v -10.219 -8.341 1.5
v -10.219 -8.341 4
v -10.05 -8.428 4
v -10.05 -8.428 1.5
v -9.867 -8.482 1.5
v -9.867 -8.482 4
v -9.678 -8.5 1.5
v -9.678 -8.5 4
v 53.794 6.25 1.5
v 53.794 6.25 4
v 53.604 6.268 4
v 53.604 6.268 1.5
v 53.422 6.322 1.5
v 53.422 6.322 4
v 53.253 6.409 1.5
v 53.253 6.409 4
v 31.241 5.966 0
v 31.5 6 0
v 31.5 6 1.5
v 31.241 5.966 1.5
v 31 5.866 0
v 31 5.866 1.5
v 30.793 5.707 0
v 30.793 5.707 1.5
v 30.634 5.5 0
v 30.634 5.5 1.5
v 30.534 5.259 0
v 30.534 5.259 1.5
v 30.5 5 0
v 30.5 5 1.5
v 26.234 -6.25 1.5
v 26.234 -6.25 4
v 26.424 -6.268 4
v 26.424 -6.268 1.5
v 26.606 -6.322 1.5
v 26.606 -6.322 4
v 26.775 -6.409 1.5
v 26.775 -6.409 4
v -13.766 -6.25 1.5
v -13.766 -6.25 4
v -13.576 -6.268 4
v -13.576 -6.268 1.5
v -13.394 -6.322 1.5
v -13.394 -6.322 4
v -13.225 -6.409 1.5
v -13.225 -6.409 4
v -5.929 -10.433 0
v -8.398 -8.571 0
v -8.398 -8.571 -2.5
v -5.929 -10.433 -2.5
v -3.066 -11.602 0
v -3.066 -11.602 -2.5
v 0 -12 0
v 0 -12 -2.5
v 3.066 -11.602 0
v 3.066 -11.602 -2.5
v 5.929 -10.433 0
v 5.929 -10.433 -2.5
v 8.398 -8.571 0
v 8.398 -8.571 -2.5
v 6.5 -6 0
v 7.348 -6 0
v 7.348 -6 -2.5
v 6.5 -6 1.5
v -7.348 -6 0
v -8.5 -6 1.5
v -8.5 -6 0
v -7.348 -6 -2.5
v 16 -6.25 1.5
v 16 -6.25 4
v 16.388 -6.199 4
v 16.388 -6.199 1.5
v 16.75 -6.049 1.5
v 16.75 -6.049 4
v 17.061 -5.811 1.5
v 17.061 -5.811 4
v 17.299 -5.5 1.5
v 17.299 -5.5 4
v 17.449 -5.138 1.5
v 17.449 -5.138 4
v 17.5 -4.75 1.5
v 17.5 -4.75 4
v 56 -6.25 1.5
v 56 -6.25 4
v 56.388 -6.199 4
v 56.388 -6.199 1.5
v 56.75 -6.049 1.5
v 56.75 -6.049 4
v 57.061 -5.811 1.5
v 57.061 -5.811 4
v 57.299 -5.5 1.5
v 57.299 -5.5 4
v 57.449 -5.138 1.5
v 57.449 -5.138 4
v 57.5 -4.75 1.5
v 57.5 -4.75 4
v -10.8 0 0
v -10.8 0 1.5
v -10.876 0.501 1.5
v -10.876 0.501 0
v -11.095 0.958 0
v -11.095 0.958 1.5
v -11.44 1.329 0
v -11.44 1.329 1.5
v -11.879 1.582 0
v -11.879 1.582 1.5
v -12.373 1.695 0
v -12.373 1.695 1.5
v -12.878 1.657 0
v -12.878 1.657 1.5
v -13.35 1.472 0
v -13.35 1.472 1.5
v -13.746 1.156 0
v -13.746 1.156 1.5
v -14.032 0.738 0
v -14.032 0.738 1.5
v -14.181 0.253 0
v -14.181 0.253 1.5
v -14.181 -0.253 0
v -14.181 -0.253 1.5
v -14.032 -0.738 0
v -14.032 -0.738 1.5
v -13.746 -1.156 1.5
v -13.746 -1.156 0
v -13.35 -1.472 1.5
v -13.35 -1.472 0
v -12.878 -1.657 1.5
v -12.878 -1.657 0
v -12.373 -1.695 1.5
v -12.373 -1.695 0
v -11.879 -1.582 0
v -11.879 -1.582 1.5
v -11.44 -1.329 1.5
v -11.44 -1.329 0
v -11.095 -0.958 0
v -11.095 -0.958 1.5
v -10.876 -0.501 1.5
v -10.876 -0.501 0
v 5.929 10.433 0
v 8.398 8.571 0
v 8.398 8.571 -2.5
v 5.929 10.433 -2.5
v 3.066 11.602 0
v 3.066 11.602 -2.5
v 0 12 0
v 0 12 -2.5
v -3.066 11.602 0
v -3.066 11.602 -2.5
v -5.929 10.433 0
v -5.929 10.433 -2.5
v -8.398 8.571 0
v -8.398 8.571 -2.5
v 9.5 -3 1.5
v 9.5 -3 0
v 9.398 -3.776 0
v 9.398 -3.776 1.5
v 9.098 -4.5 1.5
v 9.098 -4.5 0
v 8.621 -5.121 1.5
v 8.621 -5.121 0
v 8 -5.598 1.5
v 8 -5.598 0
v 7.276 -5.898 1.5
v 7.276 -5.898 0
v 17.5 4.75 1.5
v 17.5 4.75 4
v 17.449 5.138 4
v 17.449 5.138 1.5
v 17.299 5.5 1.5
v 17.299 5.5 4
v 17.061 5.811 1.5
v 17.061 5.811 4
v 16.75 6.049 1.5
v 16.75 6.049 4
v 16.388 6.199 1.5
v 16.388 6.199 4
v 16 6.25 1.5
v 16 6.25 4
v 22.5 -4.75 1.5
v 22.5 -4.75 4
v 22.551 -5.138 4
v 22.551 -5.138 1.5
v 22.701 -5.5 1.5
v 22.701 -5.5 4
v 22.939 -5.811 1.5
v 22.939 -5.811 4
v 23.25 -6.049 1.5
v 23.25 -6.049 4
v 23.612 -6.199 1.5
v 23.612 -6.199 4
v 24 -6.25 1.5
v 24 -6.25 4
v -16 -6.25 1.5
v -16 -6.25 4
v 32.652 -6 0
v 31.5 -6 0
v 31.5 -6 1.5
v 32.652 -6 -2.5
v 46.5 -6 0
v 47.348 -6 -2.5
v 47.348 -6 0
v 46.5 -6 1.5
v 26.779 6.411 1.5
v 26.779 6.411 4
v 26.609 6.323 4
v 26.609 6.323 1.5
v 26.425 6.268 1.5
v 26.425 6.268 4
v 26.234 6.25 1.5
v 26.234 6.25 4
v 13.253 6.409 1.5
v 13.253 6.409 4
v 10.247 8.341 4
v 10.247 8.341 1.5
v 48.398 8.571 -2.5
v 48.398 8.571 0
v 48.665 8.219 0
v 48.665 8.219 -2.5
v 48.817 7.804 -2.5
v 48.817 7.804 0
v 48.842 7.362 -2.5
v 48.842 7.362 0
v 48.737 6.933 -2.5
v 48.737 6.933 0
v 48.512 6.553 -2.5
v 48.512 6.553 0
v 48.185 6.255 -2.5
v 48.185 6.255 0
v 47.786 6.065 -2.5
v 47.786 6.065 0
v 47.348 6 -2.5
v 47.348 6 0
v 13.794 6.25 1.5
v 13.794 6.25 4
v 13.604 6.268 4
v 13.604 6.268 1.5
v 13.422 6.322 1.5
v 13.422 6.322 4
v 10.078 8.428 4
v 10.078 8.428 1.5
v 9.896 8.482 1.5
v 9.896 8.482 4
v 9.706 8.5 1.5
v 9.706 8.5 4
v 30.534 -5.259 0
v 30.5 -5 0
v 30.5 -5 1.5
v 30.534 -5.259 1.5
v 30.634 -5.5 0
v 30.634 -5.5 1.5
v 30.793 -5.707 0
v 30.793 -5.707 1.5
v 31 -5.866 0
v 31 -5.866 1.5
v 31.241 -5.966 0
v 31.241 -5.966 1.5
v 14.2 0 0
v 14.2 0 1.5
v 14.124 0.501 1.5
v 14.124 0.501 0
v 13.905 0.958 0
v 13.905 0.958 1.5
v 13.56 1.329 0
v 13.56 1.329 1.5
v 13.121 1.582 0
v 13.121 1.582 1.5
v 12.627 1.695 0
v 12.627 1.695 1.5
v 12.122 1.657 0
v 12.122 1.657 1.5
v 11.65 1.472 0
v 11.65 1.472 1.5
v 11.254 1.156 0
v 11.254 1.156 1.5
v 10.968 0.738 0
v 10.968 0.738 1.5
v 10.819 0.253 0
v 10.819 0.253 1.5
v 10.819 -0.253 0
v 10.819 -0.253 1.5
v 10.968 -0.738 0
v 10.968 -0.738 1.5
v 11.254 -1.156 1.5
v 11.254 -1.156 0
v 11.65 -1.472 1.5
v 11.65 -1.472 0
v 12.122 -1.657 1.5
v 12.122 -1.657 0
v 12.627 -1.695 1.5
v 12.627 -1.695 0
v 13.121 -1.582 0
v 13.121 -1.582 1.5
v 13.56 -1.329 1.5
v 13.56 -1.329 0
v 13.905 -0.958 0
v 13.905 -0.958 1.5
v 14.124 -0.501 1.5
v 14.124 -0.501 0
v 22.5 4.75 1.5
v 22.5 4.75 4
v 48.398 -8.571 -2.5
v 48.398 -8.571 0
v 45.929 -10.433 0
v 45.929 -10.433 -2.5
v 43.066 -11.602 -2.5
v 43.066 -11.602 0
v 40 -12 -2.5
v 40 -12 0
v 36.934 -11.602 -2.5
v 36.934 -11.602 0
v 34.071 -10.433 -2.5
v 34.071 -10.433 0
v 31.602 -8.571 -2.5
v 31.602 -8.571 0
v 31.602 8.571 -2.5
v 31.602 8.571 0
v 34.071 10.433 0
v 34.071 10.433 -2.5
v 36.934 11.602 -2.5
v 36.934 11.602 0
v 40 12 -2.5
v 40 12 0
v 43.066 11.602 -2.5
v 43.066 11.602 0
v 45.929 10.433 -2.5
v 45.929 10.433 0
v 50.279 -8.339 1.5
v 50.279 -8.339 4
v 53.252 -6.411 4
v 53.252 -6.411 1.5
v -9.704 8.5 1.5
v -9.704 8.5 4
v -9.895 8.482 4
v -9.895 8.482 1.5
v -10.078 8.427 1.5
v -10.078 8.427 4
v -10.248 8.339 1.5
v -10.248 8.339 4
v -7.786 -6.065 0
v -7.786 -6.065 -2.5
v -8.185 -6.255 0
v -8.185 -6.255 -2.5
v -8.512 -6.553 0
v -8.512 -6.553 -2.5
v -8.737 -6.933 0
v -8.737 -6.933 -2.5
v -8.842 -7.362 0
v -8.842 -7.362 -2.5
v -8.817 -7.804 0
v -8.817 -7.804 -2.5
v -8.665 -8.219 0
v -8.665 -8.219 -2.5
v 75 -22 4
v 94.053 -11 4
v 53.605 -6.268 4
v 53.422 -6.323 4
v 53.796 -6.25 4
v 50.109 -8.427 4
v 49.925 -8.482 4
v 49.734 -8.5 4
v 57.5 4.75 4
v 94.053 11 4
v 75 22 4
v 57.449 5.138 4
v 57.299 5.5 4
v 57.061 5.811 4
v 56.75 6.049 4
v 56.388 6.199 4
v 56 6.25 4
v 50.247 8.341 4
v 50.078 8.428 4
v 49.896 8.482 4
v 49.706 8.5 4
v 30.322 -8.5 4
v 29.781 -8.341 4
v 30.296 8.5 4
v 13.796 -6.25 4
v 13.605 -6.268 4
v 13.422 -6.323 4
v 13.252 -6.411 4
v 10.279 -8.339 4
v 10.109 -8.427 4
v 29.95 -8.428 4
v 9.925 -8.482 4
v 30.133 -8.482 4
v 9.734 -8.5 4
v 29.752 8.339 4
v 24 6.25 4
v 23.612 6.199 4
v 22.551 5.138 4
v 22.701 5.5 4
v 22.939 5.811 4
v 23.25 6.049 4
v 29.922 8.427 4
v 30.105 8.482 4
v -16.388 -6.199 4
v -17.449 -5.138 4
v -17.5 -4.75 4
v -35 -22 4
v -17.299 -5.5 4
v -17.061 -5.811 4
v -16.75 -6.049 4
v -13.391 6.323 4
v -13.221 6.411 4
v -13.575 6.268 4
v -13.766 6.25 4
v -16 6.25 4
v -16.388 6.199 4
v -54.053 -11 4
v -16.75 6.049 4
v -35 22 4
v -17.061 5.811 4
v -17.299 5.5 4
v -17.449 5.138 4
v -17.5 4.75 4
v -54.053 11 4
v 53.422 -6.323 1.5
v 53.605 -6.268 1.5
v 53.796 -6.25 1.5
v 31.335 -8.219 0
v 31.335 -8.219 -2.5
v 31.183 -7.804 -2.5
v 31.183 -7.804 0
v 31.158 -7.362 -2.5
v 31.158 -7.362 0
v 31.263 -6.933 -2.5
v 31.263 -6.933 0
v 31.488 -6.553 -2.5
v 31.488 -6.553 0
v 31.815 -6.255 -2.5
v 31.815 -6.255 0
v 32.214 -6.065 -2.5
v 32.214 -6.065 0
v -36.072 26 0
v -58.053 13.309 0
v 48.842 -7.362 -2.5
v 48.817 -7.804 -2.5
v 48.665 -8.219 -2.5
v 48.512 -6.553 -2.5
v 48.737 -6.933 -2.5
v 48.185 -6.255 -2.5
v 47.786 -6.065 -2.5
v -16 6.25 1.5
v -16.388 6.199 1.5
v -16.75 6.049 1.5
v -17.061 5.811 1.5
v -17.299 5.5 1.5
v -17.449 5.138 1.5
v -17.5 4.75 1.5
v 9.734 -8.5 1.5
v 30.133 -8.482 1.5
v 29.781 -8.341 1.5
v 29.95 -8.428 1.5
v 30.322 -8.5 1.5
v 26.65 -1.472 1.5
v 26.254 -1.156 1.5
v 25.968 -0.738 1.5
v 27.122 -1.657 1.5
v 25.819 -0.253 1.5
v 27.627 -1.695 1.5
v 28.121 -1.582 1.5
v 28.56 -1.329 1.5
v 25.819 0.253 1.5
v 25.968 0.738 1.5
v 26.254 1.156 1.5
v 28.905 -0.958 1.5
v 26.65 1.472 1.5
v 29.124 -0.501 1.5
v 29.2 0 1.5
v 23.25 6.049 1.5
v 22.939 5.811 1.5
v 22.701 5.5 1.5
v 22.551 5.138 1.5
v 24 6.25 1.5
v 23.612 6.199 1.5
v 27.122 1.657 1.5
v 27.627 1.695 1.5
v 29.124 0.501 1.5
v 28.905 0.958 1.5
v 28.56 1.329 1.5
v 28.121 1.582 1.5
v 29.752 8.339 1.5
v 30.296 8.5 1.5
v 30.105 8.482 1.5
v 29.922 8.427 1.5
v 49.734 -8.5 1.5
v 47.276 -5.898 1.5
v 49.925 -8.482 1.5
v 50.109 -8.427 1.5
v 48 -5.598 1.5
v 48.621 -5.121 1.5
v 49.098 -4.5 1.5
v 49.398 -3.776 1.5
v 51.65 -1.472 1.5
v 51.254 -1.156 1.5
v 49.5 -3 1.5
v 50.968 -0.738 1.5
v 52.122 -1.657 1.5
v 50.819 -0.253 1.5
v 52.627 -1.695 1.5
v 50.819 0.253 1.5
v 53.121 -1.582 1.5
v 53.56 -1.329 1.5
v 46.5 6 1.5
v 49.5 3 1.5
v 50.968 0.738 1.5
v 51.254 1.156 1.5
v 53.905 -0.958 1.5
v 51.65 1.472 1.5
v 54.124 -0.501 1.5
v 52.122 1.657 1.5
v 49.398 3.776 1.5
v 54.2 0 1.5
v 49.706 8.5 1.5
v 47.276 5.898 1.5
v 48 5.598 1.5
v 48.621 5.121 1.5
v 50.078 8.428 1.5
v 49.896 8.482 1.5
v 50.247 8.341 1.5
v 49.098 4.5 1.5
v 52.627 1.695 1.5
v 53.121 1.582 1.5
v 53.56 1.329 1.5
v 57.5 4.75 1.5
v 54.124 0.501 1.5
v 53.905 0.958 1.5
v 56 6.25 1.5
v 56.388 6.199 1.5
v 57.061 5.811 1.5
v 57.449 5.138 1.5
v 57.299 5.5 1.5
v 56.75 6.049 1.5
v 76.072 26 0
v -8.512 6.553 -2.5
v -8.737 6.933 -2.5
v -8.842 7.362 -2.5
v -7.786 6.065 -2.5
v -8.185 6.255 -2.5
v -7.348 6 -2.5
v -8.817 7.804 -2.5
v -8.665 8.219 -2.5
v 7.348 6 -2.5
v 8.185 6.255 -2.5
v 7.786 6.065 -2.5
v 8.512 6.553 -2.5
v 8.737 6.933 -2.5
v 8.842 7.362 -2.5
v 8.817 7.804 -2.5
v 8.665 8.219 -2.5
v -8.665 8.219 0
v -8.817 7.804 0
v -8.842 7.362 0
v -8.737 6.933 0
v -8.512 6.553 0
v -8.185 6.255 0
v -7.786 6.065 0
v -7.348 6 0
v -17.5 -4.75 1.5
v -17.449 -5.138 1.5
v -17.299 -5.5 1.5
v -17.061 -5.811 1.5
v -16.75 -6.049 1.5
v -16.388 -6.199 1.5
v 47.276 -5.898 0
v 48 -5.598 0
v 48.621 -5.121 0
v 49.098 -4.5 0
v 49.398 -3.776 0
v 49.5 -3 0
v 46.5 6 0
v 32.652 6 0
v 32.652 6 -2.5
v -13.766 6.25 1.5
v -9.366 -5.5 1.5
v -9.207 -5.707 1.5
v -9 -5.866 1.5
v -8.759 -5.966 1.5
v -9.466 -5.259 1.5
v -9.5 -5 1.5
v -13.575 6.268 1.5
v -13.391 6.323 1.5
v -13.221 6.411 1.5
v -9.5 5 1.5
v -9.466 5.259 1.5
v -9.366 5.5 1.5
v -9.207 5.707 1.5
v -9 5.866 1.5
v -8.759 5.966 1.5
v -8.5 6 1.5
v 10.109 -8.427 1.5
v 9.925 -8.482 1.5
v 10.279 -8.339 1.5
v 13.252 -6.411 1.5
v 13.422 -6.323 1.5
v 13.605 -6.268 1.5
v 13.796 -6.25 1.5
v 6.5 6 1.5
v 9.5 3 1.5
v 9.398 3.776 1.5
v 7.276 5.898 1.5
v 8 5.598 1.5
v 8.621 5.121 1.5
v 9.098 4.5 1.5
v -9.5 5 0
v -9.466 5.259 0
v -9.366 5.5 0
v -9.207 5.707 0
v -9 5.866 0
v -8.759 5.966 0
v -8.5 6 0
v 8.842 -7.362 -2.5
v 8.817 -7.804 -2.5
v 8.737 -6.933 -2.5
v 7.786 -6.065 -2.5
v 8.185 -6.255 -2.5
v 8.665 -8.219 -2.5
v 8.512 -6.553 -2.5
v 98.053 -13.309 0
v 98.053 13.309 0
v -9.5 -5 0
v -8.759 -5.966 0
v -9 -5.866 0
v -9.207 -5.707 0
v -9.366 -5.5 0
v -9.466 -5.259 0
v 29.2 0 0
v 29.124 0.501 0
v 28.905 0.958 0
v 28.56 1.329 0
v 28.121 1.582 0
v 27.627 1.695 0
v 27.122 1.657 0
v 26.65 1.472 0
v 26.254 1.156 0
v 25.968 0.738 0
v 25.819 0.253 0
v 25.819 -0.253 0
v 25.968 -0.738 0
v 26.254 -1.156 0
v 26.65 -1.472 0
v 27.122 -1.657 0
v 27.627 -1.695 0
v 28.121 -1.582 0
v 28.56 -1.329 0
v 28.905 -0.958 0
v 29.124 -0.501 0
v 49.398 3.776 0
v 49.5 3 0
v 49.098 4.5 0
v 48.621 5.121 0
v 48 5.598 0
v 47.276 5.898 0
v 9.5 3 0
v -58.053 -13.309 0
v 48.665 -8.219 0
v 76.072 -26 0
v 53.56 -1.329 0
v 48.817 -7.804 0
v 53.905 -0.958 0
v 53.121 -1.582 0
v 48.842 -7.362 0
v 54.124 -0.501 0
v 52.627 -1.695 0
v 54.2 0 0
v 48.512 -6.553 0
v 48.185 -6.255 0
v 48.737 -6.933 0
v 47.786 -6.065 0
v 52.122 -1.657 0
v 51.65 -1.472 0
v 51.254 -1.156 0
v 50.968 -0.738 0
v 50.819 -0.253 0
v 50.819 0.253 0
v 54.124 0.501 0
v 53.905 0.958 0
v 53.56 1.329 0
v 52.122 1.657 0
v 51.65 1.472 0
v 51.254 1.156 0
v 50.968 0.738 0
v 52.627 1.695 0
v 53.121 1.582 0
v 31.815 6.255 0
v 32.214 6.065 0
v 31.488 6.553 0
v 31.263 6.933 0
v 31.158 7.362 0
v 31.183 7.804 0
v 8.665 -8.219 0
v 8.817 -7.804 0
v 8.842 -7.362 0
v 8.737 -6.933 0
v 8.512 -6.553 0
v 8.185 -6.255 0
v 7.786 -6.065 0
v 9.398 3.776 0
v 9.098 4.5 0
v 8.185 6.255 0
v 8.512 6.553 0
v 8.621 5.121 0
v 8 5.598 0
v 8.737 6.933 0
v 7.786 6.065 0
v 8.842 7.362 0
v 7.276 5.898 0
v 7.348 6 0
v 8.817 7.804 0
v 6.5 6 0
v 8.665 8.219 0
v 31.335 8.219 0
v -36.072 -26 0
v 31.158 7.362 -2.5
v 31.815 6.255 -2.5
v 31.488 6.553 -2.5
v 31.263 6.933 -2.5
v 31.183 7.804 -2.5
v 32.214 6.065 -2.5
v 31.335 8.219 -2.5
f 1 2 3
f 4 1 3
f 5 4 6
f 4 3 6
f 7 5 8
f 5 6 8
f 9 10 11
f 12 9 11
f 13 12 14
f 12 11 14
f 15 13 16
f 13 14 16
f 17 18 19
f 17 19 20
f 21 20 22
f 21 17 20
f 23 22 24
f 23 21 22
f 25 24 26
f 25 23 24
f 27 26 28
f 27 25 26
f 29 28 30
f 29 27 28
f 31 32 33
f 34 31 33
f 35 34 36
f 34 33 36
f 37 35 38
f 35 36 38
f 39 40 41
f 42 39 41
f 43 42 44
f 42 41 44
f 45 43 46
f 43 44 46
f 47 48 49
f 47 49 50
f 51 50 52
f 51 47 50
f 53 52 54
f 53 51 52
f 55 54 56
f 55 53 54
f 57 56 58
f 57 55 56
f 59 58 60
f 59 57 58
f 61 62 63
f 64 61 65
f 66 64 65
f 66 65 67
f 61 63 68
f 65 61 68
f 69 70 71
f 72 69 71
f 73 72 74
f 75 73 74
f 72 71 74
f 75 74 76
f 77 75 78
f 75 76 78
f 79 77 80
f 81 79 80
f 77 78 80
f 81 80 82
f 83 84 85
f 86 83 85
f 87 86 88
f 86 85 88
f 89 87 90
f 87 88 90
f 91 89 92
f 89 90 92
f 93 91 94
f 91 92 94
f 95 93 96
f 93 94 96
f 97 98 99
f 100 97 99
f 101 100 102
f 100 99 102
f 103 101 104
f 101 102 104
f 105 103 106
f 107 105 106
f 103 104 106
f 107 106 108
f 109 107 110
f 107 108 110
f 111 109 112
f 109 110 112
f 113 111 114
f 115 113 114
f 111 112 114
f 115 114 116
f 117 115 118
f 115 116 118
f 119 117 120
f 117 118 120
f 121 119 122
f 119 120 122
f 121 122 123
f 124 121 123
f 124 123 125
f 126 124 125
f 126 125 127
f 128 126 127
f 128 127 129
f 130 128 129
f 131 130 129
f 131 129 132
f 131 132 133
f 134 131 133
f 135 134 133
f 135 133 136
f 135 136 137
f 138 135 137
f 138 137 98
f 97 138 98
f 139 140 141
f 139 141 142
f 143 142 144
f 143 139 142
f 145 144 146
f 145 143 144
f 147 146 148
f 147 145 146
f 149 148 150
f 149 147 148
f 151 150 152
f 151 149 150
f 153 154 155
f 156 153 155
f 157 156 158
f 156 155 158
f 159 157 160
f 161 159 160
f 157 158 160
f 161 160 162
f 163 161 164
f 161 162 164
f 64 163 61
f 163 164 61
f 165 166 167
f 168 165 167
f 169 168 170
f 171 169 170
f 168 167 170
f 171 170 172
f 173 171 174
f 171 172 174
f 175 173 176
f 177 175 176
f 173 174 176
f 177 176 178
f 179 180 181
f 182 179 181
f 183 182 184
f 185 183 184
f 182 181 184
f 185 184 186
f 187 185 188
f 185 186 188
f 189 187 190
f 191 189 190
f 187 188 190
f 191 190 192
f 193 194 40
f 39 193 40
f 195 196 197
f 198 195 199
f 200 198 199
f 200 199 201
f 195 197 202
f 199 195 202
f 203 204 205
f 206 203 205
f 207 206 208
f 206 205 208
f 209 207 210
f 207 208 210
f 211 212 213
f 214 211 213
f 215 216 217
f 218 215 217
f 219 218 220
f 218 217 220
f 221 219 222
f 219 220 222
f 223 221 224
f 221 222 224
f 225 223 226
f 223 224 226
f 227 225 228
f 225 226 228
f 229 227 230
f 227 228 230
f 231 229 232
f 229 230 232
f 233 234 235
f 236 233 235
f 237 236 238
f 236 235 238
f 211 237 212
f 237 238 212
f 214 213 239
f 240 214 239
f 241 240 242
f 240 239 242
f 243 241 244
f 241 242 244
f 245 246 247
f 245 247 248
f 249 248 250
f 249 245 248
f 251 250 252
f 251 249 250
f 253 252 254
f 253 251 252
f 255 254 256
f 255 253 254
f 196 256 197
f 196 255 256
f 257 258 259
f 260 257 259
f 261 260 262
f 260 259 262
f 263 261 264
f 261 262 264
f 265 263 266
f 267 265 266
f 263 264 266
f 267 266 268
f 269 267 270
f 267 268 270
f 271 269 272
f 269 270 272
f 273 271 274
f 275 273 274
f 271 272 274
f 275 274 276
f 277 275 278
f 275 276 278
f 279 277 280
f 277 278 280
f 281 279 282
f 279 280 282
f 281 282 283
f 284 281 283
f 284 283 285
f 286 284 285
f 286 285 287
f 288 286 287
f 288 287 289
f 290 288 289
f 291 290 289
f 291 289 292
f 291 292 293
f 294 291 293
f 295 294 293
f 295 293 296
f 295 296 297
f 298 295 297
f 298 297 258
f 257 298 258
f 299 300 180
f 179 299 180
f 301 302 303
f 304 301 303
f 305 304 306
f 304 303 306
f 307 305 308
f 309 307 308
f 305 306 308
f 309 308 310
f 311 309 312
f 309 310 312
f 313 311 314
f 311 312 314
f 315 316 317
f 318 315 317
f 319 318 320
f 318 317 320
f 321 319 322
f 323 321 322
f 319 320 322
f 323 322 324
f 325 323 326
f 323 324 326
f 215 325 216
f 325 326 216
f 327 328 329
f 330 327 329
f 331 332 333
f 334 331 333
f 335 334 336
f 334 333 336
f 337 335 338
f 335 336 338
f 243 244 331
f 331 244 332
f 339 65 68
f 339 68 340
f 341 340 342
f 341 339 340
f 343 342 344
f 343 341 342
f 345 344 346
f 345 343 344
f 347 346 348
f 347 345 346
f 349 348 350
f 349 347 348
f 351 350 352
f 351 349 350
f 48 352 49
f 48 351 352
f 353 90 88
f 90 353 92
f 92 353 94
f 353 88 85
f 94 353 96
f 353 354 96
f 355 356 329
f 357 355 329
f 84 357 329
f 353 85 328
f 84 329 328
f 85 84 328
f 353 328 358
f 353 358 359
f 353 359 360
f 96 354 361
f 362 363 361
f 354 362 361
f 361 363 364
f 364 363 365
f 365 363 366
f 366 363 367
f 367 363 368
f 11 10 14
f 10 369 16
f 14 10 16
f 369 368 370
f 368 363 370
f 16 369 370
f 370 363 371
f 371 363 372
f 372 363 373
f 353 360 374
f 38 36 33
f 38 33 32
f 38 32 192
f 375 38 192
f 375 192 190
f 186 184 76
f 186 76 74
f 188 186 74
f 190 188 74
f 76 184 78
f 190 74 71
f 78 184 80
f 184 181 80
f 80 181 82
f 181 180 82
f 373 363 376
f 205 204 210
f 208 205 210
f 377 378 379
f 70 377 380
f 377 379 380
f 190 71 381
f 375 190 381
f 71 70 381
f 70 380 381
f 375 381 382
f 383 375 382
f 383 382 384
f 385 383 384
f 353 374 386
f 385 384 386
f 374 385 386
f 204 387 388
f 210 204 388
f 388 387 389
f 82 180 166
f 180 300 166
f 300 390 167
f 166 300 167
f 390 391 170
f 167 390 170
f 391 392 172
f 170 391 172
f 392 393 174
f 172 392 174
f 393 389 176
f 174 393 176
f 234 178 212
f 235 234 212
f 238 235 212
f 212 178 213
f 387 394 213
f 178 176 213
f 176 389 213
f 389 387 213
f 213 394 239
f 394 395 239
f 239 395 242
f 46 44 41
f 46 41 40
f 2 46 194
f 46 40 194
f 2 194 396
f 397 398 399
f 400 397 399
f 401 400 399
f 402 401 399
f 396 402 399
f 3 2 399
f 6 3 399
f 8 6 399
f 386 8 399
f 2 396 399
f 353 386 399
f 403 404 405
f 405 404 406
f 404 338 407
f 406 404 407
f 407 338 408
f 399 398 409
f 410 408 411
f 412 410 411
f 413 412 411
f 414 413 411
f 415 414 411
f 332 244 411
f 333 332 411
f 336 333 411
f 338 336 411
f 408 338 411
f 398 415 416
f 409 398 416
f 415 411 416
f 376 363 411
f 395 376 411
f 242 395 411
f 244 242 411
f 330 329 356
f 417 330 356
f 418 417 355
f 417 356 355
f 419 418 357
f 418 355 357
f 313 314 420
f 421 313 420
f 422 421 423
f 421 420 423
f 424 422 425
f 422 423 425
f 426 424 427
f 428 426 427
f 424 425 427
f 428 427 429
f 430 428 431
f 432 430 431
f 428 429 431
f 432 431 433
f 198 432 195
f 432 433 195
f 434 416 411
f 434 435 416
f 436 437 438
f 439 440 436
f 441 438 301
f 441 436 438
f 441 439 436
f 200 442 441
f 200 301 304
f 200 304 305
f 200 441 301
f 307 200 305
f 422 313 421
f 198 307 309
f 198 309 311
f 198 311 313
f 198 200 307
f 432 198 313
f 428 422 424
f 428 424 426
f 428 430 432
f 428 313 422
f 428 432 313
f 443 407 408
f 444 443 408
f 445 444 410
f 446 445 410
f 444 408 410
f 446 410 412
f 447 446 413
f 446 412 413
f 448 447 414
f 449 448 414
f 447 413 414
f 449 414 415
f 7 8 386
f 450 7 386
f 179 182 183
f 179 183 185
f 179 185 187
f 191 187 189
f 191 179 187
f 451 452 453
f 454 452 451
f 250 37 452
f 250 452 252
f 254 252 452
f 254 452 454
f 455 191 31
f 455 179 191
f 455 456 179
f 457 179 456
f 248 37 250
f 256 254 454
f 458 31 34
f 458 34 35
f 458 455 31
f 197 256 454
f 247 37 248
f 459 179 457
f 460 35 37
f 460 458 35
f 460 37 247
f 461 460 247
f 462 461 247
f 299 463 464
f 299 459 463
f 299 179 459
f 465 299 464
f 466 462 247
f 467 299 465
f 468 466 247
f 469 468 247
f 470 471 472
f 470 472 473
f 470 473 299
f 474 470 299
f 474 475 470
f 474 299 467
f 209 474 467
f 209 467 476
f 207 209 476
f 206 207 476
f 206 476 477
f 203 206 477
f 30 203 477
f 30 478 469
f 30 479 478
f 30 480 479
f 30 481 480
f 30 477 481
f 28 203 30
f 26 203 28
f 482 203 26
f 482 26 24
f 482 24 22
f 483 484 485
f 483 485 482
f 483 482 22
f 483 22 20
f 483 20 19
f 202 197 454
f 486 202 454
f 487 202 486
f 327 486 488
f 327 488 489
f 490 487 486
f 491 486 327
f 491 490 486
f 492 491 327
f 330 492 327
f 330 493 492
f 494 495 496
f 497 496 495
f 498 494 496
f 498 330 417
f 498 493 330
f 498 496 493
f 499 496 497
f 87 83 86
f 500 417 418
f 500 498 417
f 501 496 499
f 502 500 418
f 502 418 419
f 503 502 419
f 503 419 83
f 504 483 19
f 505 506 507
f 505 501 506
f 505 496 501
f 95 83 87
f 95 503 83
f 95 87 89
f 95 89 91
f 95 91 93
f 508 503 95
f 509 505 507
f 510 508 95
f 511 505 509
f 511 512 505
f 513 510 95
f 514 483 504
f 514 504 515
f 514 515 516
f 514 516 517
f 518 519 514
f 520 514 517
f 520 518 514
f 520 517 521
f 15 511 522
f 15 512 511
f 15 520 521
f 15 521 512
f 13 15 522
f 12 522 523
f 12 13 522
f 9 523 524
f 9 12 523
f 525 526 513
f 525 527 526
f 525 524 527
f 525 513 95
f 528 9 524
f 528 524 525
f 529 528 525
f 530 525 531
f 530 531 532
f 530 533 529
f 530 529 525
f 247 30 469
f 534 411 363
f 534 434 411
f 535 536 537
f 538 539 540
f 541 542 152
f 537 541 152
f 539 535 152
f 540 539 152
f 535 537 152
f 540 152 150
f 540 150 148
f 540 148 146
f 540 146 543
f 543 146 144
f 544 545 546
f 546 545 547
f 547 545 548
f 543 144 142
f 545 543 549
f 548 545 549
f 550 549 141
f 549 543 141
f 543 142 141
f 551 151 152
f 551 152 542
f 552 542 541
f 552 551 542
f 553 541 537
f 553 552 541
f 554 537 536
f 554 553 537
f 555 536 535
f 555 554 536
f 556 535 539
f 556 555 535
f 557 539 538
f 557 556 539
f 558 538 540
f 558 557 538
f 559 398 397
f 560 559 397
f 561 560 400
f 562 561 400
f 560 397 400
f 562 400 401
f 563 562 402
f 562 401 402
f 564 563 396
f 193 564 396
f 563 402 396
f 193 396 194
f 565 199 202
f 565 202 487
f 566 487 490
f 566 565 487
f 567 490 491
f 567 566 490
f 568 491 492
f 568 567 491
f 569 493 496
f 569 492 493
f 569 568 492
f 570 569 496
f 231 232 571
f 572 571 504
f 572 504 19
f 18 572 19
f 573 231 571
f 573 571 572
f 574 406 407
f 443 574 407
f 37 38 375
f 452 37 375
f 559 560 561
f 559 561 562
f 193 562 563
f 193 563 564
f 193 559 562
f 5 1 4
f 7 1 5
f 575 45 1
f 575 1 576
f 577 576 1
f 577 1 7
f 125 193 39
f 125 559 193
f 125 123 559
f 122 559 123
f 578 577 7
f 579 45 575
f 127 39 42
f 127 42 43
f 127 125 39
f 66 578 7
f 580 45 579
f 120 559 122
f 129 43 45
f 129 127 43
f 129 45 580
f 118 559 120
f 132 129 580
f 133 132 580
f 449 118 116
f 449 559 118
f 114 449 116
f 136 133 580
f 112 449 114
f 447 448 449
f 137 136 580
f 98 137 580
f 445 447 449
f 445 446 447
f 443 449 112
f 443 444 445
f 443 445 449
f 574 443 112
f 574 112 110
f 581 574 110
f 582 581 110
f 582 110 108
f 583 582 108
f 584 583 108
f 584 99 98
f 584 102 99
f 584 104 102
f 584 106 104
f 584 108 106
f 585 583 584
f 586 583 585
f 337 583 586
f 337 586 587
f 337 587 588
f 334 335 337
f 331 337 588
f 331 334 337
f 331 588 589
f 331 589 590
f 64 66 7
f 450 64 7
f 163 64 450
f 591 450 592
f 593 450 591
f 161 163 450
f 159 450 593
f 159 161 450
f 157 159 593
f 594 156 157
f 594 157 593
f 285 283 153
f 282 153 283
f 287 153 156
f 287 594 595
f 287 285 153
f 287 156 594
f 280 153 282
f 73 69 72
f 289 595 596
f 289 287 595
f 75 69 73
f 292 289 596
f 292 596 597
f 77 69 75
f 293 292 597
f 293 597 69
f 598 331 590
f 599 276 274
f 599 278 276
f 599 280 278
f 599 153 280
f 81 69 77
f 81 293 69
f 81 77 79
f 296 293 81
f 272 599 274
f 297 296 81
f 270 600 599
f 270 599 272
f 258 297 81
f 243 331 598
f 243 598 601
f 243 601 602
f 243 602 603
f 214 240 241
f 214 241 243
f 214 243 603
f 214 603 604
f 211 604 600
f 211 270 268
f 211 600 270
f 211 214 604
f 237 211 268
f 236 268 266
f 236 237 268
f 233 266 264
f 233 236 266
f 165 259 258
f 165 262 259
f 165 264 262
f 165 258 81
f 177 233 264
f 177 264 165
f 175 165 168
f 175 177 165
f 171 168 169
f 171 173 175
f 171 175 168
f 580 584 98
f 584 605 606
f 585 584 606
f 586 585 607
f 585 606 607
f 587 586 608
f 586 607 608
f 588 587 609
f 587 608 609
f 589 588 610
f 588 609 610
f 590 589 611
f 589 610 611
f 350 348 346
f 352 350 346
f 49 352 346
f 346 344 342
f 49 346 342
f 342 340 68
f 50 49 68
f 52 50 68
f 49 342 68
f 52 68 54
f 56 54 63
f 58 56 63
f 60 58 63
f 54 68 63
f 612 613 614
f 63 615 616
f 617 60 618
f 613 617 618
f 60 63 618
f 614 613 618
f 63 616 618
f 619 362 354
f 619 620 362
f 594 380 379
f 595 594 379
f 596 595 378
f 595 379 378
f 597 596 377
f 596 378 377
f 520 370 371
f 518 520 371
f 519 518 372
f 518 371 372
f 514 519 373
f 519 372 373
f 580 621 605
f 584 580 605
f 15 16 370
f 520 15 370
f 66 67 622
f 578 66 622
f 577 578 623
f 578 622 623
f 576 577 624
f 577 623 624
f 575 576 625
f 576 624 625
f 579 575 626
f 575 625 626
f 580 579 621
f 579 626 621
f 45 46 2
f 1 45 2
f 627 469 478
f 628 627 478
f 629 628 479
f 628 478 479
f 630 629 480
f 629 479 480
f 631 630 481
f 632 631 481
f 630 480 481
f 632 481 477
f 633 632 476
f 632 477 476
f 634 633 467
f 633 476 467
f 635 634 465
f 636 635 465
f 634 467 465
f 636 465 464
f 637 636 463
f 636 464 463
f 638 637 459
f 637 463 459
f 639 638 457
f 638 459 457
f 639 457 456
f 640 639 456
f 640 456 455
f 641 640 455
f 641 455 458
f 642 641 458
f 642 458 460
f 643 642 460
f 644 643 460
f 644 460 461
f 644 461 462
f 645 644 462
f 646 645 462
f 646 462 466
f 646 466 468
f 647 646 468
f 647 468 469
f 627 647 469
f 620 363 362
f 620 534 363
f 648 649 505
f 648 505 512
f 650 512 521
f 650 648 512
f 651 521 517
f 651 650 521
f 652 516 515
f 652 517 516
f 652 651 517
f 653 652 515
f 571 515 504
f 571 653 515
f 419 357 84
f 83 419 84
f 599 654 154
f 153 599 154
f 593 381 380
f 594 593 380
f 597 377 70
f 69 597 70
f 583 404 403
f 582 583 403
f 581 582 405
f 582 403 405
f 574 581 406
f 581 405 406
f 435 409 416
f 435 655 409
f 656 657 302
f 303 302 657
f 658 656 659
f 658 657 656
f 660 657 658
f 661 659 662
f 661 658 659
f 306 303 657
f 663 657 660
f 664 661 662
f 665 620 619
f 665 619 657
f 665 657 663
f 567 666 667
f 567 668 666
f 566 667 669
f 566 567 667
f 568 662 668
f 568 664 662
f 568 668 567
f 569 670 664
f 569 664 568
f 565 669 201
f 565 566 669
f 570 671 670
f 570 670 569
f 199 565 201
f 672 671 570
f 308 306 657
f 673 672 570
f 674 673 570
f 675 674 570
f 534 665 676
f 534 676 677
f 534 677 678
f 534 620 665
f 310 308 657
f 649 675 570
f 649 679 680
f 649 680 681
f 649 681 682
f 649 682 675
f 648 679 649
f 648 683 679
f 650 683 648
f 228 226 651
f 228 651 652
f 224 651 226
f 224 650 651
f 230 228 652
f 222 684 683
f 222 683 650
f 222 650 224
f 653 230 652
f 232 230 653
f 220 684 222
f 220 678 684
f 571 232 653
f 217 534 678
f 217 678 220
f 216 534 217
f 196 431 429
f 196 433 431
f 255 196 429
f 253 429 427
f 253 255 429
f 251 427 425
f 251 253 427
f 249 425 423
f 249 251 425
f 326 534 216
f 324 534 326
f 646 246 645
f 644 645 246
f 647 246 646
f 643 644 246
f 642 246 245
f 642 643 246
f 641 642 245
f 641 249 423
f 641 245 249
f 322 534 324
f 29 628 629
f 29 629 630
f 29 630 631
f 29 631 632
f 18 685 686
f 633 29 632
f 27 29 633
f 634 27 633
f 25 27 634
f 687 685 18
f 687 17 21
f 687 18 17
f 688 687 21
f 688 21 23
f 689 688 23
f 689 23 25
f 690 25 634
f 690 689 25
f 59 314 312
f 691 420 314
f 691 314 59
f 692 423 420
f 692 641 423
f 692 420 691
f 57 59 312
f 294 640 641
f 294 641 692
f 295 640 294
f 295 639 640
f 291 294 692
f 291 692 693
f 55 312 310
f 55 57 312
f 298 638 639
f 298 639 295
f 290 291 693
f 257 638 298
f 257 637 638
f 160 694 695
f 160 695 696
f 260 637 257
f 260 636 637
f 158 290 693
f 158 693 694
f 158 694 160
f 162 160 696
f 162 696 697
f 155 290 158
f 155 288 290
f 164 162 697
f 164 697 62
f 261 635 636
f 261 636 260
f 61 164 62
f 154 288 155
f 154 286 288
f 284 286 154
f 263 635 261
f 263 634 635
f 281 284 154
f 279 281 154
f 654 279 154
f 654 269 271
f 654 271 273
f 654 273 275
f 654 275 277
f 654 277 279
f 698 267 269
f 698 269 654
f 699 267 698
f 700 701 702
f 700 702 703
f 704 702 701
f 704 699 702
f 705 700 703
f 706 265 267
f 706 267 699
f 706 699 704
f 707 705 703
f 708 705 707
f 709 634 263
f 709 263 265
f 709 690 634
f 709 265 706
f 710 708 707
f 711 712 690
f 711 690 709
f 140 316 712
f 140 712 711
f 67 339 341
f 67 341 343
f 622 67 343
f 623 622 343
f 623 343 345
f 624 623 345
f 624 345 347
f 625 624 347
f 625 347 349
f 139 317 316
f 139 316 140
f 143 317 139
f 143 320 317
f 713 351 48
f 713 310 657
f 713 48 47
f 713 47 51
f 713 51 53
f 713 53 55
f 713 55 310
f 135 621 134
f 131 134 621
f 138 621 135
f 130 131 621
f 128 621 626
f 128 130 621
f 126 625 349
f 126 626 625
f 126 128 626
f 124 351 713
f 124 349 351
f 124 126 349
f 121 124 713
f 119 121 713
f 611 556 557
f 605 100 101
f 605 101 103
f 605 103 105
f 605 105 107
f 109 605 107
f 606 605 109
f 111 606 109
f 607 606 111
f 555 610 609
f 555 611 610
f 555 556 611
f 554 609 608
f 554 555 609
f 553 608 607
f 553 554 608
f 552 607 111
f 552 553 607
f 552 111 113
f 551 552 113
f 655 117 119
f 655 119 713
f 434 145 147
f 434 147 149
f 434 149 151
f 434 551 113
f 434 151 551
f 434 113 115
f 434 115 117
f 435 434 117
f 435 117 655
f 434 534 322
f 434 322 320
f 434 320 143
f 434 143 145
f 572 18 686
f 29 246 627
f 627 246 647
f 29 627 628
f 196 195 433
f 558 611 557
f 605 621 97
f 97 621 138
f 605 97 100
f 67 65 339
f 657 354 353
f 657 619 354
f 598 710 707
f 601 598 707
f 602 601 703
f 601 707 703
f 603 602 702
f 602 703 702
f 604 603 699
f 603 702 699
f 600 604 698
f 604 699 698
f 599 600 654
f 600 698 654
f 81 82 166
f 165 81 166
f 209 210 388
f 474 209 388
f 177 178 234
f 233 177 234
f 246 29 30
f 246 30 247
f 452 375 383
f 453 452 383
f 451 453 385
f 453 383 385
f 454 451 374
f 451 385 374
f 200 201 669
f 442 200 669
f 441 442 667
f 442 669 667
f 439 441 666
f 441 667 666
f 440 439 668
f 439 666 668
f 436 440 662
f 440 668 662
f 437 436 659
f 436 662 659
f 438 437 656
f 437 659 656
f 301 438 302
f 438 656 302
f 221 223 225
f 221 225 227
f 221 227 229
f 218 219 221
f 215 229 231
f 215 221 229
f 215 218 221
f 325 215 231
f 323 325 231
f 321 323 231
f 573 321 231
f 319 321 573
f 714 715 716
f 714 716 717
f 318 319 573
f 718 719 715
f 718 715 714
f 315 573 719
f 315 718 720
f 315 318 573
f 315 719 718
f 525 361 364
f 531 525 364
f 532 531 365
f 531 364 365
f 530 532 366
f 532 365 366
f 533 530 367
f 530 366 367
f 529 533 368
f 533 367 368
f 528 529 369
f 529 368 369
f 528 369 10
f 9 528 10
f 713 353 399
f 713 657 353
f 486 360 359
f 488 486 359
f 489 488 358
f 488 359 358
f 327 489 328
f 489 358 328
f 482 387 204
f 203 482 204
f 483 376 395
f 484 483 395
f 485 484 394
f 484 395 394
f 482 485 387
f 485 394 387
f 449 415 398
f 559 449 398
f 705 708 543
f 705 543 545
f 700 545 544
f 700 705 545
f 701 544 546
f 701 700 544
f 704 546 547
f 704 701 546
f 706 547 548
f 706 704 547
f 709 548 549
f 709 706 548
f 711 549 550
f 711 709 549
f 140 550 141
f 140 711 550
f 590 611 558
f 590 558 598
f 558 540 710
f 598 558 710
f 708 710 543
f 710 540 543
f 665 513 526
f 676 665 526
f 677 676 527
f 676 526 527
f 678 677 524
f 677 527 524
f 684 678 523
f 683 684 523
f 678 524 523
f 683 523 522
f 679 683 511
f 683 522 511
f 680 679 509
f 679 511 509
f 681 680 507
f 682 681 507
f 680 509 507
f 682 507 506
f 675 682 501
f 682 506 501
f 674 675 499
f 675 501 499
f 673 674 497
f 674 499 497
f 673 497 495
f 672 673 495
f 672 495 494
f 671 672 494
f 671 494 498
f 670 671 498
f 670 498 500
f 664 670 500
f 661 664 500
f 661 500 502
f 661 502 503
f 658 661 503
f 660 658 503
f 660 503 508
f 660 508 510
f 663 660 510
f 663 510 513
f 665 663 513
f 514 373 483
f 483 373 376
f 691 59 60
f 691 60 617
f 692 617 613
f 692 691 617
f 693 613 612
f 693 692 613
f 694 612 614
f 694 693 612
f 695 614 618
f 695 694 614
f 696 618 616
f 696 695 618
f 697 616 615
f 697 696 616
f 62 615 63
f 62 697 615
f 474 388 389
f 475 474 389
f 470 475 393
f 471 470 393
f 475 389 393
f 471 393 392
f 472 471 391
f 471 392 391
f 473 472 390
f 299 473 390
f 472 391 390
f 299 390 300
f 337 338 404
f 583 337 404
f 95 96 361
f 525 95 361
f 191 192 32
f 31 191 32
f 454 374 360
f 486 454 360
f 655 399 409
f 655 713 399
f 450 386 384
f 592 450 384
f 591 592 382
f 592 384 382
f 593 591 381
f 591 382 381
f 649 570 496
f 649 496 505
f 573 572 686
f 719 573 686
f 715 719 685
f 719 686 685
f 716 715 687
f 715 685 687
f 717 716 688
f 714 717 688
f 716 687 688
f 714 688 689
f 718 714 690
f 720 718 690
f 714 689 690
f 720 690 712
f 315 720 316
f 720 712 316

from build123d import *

# Parameters (mm, degrees)
BOSS_EXTRUDE1_DEPTH = 4
BOSS_EXTRUDE2_DEPTH = 2.5
CUT_EXTRUDE1_DEPTH  = 2.5
CUT_EXTRUDE2_DEPTH  = 7.5
SKETCH5_R           = 1.7
CUT_EXTRUDE3_DEPTH  = 5
SKETCH7_OUTSIDE_W   = 218.062
SKETCH7_OUTSIDE_H   = 108.062
CUT_EXTRUDE4_DEPTH  = 7.5
CUT_EXTRUDE4_TAPER  = 45


with BuildPart() as part:
    # Sketch1 → Boss-Extrude1 (new body)
    with BuildSketch(Plane.XY):
        with BuildLine():
            Line((-35, 28), (75, 28))
            ThreePointArc((75, 28), (103, 0), (75, -28))
            Line((75, -28), (-35, -28))
            ThreePointArc((-35, -28), (-63, 0), (-35, 28))
        make_face()
    extrude(amount=BOSS_EXTRUDE1_DEPTH)

    # Sketch2 → Boss-Extrude2 (add)
    with BuildSketch(Plane(origin=(0, 0, 0), x_dir=(-1, 0, 0), z_dir=(0, 0, -1))):
        with BuildLine():
            Line((-7.348469228, -6), (7.348469228, -6))
            ThreePointArc((7.348469228, -6), (8.737199378, -6.93305329), (8.398250547, -8.571428571))
            ThreePointArc((8.398250547, -8.571428571), (0, -12), (-8.398250547, -8.571428571))
            ThreePointArc((-8.398250547, -8.571428571), (-8.737199378, -6.93305329), (-7.348469228, -6))
        make_face()
        with BuildLine():
            Line((7.348469228, 6), (-7.348469228, 6))
            ThreePointArc((-7.348469228, 6), (-8.737199378, 6.93305329), (-8.398250547, 8.571428571))
            ThreePointArc((-8.398250547, 8.571428571), (0, 12), (8.398250547, 8.571428571))
            ThreePointArc((8.398250547, 8.571428571), (8.737199378, 6.93305329), (7.348469228, 6))
        make_face()
        with BuildLine():
            Line((-47.348469228, 6), (-32.651530772, 6))
            ThreePointArc((-32.651530772, 6), (-31.262800622, 6.93305329), (-31.601749453, 8.571428571))
            ThreePointArc((-31.601749453, 8.571428571), (-40, 12), (-48.398250547, 8.571428571))
            ThreePointArc((-48.398250547, 8.571428571), (-48.737199378, 6.93305329), (-47.348469228, 6))
        make_face()
        with BuildLine():
            Line((-32.651530772, -6), (-47.348469228, -6))
            ThreePointArc((-47.348469228, -6), (-48.737199378, -6.93305329), (-48.398250547, -8.571428571))
            ThreePointArc((-48.398250547, -8.571428571), (-40, -12), (-31.601749453, -8.571428571))
            ThreePointArc((-31.601749453, -8.571428571), (-31.262800622, -6.93305329), (-32.651530772, -6))
        make_face()
    extrude(amount=BOSS_EXTRUDE2_DEPTH)

    # Sketch3 → Cut-Extrude1 (cut)
    with BuildSketch(Plane.XY.offset(4)):
        with BuildLine():
            Line((-17.5, 4.75), (-17.5, -4.75))
            ThreePointArc((-17.5, -4.75), (-17.060660172, -5.810660172), (-16, -6.25))
            Line((-16, -6.25), (-13.765564437, -6.25))
            ThreePointArc((-13.765564437, -6.25), (-13.483765285, -6.290526583), (-13.224806846, -6.408821525))
            Line((-13.224806846, -6.408821525), (-10.218918256, -8.341178475))
            ThreePointArc((-10.218918256, -8.341178475), (-9.959959817, -8.459473417), (-9.678160664, -8.5))
            Line((-9.678160664, -8.5), (9.734435563, -8.5))
            ThreePointArc((9.734435563, -8.5), (10.018134319, -8.458913456), (10.278520672, -8.339030031))
            Line((10.278520672, -8.339030031), (13.251769281, -6.410969969))
            ThreePointArc((13.251769281, -6.410969969), (13.512155635, -6.291086544), (13.795854391, -6.25))
            Line((13.795854391, -6.25), (16, -6.25))
            ThreePointArc((16, -6.25), (17.060660172, -5.810660172), (17.5, -4.75))
            Line((17.5, -4.75), (17.5, 4.75))
            ThreePointArc((17.5, 4.75), (17.060660172, 5.810660172), (16, 6.25))
            Line((16, 6.25), (13.793701886, 6.25))
            ThreePointArc((13.793701886, 6.25), (13.511902734, 6.290526583), (13.252944295, 6.408821525))
            Line((13.252944295, 6.408821525), (10.247055705, 8.341178475))
            ThreePointArc((10.247055705, 8.341178475), (9.988097266, 8.459473417), (9.706298114, 8.5))
            Line((9.706298114, 8.5), (-9.704145609, 8.5))
            ThreePointArc((-9.704145609, 8.5), (-9.987844365, 8.458913456), (-10.248230719, 8.339030031))
            Line((-10.248230719, 8.339030031), (-13.221479328, 6.410969969))
            ThreePointArc((-13.221479328, 6.410969969), (-13.481865681, 6.291086544), (-13.765564437, 6.25))
            Line((-13.765564437, 6.25), (-16, 6.25))
            ThreePointArc((-16, 6.25), (-17.060660172, 5.810660172), (-17.5, 4.75))
        make_face()
        with BuildLine():
            Line((22.5, 4.75), (22.5, -4.75))
            ThreePointArc((22.5, -4.75), (22.939339828, -5.810660172), (24, -6.25))
            Line((24, -6.25), (26.234435563, -6.25))
            ThreePointArc((26.234435563, -6.25), (26.516234715, -6.290526583), (26.775193154, -6.408821525))
            Line((26.775193154, -6.408821525), (29.781081744, -8.341178475))
            ThreePointArc((29.781081744, -8.341178475), (30.040040183, -8.459473417), (30.321839336, -8.5))
            Line((30.321839336, -8.5), (49.734435563, -8.5))
            ThreePointArc((49.734435563, -8.5), (50.018134319, -8.458913456), (50.278520672, -8.339030031))
            Line((50.278520672, -8.339030031), (53.251769281, -6.410969969))
            ThreePointArc((53.251769281, -6.410969969), (53.512155635, -6.291086544), (53.795854391, -6.25))
            Line((53.795854391, -6.25), (56, -6.25))
            ThreePointArc((56, -6.25), (57.060660172, -5.810660172), (57.5, -4.75))
            Line((57.5, -4.75), (57.5, 4.75))
            ThreePointArc((57.5, 4.75), (57.060660172, 5.810660172), (56, 6.25))
            Line((56, 6.25), (53.793701886, 6.25))
            ThreePointArc((53.793701886, 6.25), (53.511902734, 6.290526583), (53.252944295, 6.408821525))
            Line((53.252944295, 6.408821525), (50.247055705, 8.341178475))
            ThreePointArc((50.247055705, 8.341178475), (49.988097266, 8.459473417), (49.706298114, 8.5))
            Line((49.706298114, 8.5), (30.295854391, 8.5))
            ThreePointArc((30.295854391, 8.5), (30.012155635, 8.458913456), (29.751769281, 8.339030031))
            Line((29.751769281, 8.339030031), (26.778520672, 6.410969969))
            ThreePointArc((26.778520672, 6.410969969), (26.518134319, 6.291086544), (26.234435563, 6.25))
            Line((26.234435563, 6.25), (24, 6.25))
            ThreePointArc((24, 6.25), (22.939339828, 5.810660172), (22.5, 4.75))
        make_face()
    extrude(amount=-CUT_EXTRUDE1_DEPTH, mode=Mode.SUBTRACT)

    # Sketch4 → Cut-Extrude2 (cut, through all)
    with BuildSketch(Plane(origin=(0, 0, -2.5), x_dir=(-1, 0, 0), z_dir=(0, 0, -1))):
        with BuildLine():
            Line((-6.5, -6), (8.5, -6))
            ThreePointArc((8.5, -6), (9.207106781, -5.707106781), (9.5, -5))
            Line((9.5, -5), (9.5, 5))
            ThreePointArc((9.5, 5), (9.207106781, 5.707106781), (8.5, 6))
            Line((8.5, 6), (-6.5, 6))
            ThreePointArc((-6.5, 6), (-8.621320344, 5.121320344), (-9.5, 3))
            Line((-9.5, 3), (-9.5, -3))
            ThreePointArc((-9.5, -3), (-8.621320344, -5.121320344), (-6.5, -6))
        make_face()
        with BuildLine():
            Line((-46.5, 6), (-31.5, 6))
            ThreePointArc((-31.5, 6), (-30.792893219, 5.707106781), (-30.5, 5))
            Line((-30.5, 5), (-30.5, -5))
            ThreePointArc((-30.5, -5), (-30.792893219, -5.707106781), (-31.5, -6))
            Line((-31.5, -6), (-46.5, -6))
            ThreePointArc((-46.5, -6), (-48.621320344, -5.121320344), (-49.5, -3))
            Line((-49.5, -3), (-49.5, 3))
            ThreePointArc((-49.5, 3), (-48.621320344, 5.121320344), (-46.5, 6))
        make_face()
    extrude(amount=-CUT_EXTRUDE2_DEPTH, mode=Mode.SUBTRACT)

    # Sketch5 → Cut-Extrude3 (cut, through all)
    with BuildSketch(Plane.XY.offset(1.5)):
        with Locations((-12.5, 0)):
            Circle(SKETCH5_R)
        with Locations((12.5, 0)):
            Circle(SKETCH5_R)
        with Locations((27.5, 0)):
            Circle(SKETCH5_R)
        with Locations((52.5, 0)):
            Circle(SKETCH5_R)
    extrude(amount=-CUT_EXTRUDE3_DEPTH, mode=Mode.SUBTRACT)

    # Sketch7 outside → Cut-Extrude4 (cut, through all)
    with BuildSketch(Plane.XY.offset(4)):
        with Locations((20, 0)):
            Rectangle(SKETCH7_OUTSIDE_W, SKETCH7_OUTSIDE_H)
        Polygon((-35, 22), (-54.052558883, 11), (-54.052558883, -11), (-35, -22), (75, -22), (94.052558883, -11), (94.052558883, 11), (75, 22), align=None, mode=Mode.SUBTRACT)
    extrude(amount=-CUT_EXTRUDE4_DEPTH, taper=CUT_EXTRUDE4_TAPER, mode=Mode.SUBTRACT)


solid = part.part
